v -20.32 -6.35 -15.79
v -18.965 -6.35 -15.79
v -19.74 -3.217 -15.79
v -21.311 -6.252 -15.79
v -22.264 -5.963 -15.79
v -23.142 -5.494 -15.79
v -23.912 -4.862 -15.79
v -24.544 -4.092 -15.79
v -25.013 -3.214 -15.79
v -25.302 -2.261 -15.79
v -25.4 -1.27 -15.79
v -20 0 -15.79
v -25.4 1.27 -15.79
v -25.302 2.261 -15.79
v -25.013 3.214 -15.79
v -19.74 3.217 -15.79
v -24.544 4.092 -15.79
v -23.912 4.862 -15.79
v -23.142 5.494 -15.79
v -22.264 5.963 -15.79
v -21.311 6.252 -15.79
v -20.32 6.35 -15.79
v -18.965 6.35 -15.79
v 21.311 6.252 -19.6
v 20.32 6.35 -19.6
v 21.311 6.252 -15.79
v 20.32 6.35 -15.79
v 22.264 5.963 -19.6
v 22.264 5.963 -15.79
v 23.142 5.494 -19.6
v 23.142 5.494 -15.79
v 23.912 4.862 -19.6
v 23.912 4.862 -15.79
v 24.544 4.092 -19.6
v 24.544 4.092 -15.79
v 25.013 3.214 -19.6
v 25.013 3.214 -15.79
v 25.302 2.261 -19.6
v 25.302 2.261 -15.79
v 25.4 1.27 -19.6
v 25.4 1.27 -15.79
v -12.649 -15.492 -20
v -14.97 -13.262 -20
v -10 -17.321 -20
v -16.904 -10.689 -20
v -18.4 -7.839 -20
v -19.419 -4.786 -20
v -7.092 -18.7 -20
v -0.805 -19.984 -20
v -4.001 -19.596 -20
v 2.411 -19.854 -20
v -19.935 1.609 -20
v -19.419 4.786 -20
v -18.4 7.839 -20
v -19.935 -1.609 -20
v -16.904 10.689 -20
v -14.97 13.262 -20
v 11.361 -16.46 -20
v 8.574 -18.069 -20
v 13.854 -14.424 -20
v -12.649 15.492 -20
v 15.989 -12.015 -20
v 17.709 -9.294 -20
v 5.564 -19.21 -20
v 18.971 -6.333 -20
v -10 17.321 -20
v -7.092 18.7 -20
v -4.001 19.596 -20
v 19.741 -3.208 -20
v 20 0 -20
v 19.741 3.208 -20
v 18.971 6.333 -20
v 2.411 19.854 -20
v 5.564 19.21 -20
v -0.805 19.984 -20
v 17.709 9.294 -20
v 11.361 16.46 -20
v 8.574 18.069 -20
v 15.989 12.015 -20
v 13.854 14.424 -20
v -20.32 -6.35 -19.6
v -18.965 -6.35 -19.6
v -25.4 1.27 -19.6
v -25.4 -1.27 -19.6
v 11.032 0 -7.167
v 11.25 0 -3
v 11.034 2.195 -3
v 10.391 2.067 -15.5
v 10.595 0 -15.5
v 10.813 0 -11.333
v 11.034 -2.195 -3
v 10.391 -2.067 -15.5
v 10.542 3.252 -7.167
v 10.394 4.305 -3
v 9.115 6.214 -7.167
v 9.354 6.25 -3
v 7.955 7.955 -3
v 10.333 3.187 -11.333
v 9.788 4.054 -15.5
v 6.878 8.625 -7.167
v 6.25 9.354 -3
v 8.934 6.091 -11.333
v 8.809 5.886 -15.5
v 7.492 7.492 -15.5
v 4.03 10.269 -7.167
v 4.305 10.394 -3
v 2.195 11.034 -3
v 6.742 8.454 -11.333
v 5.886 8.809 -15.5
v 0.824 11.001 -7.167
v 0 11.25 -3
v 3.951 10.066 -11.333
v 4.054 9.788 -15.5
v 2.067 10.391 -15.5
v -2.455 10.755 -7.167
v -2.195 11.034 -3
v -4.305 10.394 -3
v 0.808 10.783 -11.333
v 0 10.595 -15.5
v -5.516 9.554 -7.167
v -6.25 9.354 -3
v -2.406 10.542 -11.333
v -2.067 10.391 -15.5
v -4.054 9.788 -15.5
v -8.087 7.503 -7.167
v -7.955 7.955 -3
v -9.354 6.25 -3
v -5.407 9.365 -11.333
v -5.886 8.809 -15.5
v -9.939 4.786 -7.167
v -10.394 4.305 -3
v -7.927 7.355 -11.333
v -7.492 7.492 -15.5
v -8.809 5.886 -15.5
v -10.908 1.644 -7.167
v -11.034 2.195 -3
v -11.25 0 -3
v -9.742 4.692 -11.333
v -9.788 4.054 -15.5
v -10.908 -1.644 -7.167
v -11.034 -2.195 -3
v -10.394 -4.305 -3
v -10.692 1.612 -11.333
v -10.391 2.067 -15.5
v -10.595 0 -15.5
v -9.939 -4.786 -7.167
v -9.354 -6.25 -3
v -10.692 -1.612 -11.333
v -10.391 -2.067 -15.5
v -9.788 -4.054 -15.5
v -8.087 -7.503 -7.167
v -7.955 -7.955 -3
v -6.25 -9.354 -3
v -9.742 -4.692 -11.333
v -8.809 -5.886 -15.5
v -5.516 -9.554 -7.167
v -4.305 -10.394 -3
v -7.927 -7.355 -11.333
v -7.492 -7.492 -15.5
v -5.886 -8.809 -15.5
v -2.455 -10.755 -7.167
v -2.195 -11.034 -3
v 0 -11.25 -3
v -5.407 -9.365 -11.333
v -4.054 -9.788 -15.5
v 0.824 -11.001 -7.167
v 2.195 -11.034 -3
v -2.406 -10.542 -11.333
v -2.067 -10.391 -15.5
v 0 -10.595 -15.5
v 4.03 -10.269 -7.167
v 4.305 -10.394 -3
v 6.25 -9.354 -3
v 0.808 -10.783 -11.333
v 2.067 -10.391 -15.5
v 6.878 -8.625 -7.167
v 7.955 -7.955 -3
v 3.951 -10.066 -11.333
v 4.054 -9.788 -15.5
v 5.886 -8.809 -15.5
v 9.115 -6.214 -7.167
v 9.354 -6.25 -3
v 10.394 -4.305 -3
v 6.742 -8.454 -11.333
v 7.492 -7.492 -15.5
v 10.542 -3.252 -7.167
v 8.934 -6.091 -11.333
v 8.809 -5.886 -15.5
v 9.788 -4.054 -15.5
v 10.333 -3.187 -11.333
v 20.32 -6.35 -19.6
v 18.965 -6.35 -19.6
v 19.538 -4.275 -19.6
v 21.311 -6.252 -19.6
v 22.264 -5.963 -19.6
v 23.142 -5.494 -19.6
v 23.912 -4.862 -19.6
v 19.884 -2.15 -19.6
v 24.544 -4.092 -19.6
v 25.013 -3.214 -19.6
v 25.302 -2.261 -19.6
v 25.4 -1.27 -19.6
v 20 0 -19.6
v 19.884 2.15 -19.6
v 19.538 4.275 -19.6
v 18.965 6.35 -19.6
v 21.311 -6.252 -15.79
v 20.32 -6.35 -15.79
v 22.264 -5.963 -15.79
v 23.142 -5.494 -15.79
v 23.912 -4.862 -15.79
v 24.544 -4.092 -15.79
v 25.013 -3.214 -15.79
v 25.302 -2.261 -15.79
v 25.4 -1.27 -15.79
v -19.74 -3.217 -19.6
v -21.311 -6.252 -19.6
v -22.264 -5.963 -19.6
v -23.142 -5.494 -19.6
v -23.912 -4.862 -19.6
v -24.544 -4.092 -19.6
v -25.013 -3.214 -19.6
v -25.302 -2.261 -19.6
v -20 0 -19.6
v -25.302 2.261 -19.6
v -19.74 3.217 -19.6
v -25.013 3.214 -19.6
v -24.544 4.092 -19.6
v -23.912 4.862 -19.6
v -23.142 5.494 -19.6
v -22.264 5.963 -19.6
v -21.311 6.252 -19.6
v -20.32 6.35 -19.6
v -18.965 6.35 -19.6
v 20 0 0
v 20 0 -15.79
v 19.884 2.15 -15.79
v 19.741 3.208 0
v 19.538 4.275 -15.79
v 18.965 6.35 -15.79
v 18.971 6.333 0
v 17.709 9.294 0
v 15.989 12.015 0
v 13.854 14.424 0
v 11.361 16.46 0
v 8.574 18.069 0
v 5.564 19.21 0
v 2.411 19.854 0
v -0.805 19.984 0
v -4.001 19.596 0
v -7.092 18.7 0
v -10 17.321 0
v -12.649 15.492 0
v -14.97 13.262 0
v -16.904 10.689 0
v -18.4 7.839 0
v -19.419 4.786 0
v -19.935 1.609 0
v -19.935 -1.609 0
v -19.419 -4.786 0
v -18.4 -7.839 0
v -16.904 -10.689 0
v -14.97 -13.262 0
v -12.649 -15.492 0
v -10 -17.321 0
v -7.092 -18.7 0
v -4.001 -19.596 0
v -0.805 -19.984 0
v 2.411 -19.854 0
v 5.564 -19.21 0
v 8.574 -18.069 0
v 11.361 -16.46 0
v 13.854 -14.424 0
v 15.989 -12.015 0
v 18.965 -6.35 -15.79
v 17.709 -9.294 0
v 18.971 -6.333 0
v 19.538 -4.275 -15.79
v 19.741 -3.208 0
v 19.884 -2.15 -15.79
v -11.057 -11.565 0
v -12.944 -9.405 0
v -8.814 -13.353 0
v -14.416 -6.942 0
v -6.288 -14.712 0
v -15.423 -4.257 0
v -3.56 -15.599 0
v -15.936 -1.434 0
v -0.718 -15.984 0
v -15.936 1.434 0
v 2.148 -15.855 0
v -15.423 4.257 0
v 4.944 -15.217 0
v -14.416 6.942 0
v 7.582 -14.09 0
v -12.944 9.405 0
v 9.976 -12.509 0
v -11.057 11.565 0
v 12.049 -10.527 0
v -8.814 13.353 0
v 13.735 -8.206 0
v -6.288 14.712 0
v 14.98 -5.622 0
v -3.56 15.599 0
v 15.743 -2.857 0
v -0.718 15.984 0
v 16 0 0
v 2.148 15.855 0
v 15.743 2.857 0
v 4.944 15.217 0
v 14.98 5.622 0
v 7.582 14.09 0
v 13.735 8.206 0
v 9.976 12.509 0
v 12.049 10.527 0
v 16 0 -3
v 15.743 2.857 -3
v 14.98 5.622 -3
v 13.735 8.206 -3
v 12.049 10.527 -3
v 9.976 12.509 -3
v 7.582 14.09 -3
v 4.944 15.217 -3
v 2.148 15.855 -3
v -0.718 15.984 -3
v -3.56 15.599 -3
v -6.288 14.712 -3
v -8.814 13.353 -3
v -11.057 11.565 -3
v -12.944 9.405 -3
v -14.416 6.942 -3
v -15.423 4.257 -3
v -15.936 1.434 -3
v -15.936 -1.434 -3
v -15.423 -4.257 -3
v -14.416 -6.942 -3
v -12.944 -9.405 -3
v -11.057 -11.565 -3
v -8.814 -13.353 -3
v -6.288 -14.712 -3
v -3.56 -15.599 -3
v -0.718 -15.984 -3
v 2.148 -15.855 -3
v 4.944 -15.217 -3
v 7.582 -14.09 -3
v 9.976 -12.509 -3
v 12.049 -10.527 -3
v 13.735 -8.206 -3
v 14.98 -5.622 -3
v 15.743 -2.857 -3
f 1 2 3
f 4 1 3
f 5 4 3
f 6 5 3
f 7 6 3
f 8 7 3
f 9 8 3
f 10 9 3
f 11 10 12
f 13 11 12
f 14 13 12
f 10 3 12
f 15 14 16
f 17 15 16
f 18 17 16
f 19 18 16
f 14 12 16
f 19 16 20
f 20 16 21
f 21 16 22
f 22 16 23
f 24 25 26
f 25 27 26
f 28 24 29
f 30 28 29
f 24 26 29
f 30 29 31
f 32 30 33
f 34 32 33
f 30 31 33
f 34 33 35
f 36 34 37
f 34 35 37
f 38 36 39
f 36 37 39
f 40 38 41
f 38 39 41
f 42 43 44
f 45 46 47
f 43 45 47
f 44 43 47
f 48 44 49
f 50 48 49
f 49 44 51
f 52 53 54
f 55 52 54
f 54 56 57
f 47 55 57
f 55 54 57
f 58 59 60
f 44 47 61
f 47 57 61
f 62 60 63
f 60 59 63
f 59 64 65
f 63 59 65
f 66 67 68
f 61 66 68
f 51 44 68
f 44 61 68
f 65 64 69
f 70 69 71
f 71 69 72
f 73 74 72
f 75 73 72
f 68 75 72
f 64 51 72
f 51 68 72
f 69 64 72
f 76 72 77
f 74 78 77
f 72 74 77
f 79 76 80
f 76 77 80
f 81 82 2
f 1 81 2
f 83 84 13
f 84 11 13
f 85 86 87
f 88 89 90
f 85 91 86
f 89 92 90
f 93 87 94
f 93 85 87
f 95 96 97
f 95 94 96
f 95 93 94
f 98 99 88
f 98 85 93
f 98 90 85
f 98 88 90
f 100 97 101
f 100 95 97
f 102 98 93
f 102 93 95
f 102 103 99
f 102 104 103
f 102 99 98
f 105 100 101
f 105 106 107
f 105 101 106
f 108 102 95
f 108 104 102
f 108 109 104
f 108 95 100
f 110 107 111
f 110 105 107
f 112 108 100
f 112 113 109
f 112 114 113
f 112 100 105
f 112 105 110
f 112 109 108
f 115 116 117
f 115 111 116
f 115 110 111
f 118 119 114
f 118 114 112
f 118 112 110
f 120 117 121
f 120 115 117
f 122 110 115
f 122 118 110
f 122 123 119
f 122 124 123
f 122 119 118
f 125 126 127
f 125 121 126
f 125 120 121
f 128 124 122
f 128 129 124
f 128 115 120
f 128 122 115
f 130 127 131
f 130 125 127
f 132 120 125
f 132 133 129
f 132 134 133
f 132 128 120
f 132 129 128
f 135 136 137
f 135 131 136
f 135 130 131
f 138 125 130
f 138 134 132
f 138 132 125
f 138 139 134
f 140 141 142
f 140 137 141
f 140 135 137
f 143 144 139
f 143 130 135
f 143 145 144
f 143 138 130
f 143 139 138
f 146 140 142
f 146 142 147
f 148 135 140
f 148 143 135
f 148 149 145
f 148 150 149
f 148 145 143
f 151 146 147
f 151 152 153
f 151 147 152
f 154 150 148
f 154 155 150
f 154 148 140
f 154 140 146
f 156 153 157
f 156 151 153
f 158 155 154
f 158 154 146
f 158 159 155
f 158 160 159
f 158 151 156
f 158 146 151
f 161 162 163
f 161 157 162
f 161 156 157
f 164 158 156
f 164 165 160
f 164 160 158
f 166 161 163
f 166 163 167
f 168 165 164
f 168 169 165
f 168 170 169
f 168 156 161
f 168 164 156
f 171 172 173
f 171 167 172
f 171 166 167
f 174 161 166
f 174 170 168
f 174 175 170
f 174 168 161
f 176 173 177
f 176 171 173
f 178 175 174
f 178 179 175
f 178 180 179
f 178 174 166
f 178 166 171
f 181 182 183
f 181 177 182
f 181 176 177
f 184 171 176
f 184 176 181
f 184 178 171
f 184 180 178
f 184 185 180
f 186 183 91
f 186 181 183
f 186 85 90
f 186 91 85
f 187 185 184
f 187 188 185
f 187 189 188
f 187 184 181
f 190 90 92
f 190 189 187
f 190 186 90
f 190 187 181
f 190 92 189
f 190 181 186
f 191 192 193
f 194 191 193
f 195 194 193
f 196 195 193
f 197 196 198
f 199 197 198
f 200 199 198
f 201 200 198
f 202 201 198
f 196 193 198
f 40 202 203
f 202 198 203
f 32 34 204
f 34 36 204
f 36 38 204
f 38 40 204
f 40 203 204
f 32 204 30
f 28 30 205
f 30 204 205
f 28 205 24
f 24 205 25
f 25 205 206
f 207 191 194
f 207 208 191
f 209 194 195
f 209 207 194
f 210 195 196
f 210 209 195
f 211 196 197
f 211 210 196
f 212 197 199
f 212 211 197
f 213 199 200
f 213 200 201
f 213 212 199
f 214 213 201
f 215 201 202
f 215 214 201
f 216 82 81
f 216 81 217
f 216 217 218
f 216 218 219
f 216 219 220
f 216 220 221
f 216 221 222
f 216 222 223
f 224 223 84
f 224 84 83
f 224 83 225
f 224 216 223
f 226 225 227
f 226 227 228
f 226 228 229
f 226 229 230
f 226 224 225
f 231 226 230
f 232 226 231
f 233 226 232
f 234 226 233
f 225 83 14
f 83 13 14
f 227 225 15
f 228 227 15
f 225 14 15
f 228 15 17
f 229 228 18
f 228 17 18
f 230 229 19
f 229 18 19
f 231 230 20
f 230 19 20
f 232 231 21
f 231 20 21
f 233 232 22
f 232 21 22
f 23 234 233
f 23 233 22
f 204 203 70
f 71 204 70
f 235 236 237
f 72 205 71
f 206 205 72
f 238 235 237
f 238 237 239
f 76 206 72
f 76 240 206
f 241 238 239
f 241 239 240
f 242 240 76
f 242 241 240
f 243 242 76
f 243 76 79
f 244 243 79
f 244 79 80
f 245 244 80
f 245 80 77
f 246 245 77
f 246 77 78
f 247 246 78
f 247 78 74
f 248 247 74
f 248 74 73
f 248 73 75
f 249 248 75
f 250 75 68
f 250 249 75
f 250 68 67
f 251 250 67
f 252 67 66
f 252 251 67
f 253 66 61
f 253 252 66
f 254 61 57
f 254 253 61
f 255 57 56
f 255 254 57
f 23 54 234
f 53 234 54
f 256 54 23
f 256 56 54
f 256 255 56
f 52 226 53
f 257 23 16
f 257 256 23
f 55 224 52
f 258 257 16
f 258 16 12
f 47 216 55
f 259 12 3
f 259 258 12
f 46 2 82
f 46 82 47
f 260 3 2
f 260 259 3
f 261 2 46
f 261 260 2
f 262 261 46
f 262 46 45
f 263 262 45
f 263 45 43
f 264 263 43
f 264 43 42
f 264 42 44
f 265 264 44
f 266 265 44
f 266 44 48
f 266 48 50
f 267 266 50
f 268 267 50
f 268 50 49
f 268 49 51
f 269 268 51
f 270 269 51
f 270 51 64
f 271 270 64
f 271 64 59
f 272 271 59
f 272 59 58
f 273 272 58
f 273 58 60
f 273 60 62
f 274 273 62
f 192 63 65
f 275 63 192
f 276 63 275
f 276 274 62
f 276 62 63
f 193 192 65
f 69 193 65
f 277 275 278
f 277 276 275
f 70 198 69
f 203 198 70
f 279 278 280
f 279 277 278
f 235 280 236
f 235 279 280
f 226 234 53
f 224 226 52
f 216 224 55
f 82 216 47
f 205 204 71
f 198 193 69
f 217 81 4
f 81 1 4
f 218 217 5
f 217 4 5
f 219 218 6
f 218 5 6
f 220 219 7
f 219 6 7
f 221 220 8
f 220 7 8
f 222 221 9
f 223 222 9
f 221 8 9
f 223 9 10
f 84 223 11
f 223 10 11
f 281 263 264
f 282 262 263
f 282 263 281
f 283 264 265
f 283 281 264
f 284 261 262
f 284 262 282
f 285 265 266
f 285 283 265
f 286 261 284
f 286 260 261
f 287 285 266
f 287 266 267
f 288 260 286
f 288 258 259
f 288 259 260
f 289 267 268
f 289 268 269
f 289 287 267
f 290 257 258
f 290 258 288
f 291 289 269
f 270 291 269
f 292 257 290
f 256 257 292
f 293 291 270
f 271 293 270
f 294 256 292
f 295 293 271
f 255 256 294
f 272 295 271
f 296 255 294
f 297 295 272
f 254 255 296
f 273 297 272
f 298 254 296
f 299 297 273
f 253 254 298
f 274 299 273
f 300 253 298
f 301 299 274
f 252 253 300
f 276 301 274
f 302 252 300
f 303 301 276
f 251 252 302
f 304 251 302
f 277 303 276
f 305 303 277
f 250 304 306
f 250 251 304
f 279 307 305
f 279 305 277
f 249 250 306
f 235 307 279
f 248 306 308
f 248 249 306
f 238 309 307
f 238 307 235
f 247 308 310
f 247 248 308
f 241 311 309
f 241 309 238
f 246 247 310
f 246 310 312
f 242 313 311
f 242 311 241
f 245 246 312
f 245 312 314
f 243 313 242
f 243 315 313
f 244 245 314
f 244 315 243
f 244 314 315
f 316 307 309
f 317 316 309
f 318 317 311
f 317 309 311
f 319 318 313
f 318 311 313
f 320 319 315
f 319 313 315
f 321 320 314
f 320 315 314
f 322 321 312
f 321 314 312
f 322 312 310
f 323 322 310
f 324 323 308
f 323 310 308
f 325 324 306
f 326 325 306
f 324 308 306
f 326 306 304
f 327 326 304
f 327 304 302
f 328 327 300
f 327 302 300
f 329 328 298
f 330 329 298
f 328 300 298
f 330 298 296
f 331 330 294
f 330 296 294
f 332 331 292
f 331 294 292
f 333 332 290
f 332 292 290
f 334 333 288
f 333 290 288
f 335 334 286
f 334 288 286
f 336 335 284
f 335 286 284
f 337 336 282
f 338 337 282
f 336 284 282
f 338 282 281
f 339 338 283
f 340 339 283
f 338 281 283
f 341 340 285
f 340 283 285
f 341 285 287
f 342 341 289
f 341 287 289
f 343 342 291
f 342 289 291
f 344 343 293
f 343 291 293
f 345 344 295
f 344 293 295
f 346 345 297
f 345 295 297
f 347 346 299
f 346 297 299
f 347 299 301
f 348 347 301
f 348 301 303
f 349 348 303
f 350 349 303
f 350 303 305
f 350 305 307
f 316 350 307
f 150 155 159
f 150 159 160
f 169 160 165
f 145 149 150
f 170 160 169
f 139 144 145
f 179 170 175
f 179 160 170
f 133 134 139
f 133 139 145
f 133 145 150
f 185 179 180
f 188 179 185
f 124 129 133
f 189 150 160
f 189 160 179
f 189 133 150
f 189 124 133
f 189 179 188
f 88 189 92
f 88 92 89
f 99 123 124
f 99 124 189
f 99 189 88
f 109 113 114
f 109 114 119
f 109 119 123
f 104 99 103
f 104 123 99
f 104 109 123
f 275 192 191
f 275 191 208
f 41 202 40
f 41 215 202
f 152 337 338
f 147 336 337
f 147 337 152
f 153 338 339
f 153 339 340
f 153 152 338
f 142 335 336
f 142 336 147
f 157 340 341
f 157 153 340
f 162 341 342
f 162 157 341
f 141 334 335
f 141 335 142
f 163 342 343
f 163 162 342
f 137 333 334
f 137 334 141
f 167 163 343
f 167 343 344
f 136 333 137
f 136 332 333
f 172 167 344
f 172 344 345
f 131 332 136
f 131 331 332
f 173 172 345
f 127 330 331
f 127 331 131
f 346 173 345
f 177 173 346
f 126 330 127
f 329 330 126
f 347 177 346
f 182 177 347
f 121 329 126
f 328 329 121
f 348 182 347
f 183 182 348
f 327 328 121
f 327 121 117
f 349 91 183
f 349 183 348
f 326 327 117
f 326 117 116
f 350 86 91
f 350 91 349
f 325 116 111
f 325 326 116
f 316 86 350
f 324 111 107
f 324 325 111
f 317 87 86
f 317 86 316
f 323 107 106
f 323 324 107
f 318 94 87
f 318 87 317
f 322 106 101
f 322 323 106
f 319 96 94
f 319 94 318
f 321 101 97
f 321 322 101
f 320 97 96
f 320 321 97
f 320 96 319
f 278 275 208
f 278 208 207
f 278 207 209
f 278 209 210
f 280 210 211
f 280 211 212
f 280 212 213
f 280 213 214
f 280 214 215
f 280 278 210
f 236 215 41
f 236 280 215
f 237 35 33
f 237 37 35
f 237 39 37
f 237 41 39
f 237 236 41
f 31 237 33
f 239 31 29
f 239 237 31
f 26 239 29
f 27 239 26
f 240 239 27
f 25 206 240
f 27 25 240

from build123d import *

# Parameters (mm, degrees)
F0_R     = 20
F1_DEPTH = 20
F2_R     = 16
F3_DEPTH = 3
F4_R     = 11.25
F5_DEPTH = 12.5
F5_TAPER = 3
F6_W     = 12.7
F6_H     = 3.81
F7_DEPTH = 25.4
F8_DEPTH = 25.4
F9_R     = 5.08


with BuildPart() as f1:
    # F0 (on Top) → F1 (new body)
    with BuildSketch(Plane.XY):
        Circle(F0_R)
    extrude(amount=-F1_DEPTH)

    # F2 (on face) → F3 (cut)
    with BuildSketch(Plane.XY):
        Circle(F2_R)
    extrude(amount=-F3_DEPTH, mode=Mode.SUBTRACT)

    # F4 (on face) → F5 (cut)
    with BuildSketch(Plane.XY.offset(-3)):
        Circle(F4_R)
    extrude(amount=-F5_DEPTH, taper=F5_TAPER, mode=Mode.SUBTRACT)

    # F6 (on Right) → F7 (join)
    with BuildSketch(Plane.YZ):
        with Locations((0, -17.6945884627)):
            Rectangle(F6_W, F6_H)
    extrude(amount=F7_DEPTH)

    # F6 (on Right) → F8 (join)
    with BuildSketch(Plane.YZ):
        with Locations((0, -17.6945884627)):
            Rectangle(F6_W, F6_H)
    extrude(amount=-F8_DEPTH)

    # F9
    f9_edges = [f1.edges().sort_by_distance(p)[0] for p in [
        (-25.4, 6.35, -17.694588),
        (-25.4, -6.35, -17.694588),
        (25.4, -6.35, -17.694588),
        (25.4, 6.35, -17.694588),
    ]]
    fillet(f9_edges, radius=F9_R)


solid = f1.part
